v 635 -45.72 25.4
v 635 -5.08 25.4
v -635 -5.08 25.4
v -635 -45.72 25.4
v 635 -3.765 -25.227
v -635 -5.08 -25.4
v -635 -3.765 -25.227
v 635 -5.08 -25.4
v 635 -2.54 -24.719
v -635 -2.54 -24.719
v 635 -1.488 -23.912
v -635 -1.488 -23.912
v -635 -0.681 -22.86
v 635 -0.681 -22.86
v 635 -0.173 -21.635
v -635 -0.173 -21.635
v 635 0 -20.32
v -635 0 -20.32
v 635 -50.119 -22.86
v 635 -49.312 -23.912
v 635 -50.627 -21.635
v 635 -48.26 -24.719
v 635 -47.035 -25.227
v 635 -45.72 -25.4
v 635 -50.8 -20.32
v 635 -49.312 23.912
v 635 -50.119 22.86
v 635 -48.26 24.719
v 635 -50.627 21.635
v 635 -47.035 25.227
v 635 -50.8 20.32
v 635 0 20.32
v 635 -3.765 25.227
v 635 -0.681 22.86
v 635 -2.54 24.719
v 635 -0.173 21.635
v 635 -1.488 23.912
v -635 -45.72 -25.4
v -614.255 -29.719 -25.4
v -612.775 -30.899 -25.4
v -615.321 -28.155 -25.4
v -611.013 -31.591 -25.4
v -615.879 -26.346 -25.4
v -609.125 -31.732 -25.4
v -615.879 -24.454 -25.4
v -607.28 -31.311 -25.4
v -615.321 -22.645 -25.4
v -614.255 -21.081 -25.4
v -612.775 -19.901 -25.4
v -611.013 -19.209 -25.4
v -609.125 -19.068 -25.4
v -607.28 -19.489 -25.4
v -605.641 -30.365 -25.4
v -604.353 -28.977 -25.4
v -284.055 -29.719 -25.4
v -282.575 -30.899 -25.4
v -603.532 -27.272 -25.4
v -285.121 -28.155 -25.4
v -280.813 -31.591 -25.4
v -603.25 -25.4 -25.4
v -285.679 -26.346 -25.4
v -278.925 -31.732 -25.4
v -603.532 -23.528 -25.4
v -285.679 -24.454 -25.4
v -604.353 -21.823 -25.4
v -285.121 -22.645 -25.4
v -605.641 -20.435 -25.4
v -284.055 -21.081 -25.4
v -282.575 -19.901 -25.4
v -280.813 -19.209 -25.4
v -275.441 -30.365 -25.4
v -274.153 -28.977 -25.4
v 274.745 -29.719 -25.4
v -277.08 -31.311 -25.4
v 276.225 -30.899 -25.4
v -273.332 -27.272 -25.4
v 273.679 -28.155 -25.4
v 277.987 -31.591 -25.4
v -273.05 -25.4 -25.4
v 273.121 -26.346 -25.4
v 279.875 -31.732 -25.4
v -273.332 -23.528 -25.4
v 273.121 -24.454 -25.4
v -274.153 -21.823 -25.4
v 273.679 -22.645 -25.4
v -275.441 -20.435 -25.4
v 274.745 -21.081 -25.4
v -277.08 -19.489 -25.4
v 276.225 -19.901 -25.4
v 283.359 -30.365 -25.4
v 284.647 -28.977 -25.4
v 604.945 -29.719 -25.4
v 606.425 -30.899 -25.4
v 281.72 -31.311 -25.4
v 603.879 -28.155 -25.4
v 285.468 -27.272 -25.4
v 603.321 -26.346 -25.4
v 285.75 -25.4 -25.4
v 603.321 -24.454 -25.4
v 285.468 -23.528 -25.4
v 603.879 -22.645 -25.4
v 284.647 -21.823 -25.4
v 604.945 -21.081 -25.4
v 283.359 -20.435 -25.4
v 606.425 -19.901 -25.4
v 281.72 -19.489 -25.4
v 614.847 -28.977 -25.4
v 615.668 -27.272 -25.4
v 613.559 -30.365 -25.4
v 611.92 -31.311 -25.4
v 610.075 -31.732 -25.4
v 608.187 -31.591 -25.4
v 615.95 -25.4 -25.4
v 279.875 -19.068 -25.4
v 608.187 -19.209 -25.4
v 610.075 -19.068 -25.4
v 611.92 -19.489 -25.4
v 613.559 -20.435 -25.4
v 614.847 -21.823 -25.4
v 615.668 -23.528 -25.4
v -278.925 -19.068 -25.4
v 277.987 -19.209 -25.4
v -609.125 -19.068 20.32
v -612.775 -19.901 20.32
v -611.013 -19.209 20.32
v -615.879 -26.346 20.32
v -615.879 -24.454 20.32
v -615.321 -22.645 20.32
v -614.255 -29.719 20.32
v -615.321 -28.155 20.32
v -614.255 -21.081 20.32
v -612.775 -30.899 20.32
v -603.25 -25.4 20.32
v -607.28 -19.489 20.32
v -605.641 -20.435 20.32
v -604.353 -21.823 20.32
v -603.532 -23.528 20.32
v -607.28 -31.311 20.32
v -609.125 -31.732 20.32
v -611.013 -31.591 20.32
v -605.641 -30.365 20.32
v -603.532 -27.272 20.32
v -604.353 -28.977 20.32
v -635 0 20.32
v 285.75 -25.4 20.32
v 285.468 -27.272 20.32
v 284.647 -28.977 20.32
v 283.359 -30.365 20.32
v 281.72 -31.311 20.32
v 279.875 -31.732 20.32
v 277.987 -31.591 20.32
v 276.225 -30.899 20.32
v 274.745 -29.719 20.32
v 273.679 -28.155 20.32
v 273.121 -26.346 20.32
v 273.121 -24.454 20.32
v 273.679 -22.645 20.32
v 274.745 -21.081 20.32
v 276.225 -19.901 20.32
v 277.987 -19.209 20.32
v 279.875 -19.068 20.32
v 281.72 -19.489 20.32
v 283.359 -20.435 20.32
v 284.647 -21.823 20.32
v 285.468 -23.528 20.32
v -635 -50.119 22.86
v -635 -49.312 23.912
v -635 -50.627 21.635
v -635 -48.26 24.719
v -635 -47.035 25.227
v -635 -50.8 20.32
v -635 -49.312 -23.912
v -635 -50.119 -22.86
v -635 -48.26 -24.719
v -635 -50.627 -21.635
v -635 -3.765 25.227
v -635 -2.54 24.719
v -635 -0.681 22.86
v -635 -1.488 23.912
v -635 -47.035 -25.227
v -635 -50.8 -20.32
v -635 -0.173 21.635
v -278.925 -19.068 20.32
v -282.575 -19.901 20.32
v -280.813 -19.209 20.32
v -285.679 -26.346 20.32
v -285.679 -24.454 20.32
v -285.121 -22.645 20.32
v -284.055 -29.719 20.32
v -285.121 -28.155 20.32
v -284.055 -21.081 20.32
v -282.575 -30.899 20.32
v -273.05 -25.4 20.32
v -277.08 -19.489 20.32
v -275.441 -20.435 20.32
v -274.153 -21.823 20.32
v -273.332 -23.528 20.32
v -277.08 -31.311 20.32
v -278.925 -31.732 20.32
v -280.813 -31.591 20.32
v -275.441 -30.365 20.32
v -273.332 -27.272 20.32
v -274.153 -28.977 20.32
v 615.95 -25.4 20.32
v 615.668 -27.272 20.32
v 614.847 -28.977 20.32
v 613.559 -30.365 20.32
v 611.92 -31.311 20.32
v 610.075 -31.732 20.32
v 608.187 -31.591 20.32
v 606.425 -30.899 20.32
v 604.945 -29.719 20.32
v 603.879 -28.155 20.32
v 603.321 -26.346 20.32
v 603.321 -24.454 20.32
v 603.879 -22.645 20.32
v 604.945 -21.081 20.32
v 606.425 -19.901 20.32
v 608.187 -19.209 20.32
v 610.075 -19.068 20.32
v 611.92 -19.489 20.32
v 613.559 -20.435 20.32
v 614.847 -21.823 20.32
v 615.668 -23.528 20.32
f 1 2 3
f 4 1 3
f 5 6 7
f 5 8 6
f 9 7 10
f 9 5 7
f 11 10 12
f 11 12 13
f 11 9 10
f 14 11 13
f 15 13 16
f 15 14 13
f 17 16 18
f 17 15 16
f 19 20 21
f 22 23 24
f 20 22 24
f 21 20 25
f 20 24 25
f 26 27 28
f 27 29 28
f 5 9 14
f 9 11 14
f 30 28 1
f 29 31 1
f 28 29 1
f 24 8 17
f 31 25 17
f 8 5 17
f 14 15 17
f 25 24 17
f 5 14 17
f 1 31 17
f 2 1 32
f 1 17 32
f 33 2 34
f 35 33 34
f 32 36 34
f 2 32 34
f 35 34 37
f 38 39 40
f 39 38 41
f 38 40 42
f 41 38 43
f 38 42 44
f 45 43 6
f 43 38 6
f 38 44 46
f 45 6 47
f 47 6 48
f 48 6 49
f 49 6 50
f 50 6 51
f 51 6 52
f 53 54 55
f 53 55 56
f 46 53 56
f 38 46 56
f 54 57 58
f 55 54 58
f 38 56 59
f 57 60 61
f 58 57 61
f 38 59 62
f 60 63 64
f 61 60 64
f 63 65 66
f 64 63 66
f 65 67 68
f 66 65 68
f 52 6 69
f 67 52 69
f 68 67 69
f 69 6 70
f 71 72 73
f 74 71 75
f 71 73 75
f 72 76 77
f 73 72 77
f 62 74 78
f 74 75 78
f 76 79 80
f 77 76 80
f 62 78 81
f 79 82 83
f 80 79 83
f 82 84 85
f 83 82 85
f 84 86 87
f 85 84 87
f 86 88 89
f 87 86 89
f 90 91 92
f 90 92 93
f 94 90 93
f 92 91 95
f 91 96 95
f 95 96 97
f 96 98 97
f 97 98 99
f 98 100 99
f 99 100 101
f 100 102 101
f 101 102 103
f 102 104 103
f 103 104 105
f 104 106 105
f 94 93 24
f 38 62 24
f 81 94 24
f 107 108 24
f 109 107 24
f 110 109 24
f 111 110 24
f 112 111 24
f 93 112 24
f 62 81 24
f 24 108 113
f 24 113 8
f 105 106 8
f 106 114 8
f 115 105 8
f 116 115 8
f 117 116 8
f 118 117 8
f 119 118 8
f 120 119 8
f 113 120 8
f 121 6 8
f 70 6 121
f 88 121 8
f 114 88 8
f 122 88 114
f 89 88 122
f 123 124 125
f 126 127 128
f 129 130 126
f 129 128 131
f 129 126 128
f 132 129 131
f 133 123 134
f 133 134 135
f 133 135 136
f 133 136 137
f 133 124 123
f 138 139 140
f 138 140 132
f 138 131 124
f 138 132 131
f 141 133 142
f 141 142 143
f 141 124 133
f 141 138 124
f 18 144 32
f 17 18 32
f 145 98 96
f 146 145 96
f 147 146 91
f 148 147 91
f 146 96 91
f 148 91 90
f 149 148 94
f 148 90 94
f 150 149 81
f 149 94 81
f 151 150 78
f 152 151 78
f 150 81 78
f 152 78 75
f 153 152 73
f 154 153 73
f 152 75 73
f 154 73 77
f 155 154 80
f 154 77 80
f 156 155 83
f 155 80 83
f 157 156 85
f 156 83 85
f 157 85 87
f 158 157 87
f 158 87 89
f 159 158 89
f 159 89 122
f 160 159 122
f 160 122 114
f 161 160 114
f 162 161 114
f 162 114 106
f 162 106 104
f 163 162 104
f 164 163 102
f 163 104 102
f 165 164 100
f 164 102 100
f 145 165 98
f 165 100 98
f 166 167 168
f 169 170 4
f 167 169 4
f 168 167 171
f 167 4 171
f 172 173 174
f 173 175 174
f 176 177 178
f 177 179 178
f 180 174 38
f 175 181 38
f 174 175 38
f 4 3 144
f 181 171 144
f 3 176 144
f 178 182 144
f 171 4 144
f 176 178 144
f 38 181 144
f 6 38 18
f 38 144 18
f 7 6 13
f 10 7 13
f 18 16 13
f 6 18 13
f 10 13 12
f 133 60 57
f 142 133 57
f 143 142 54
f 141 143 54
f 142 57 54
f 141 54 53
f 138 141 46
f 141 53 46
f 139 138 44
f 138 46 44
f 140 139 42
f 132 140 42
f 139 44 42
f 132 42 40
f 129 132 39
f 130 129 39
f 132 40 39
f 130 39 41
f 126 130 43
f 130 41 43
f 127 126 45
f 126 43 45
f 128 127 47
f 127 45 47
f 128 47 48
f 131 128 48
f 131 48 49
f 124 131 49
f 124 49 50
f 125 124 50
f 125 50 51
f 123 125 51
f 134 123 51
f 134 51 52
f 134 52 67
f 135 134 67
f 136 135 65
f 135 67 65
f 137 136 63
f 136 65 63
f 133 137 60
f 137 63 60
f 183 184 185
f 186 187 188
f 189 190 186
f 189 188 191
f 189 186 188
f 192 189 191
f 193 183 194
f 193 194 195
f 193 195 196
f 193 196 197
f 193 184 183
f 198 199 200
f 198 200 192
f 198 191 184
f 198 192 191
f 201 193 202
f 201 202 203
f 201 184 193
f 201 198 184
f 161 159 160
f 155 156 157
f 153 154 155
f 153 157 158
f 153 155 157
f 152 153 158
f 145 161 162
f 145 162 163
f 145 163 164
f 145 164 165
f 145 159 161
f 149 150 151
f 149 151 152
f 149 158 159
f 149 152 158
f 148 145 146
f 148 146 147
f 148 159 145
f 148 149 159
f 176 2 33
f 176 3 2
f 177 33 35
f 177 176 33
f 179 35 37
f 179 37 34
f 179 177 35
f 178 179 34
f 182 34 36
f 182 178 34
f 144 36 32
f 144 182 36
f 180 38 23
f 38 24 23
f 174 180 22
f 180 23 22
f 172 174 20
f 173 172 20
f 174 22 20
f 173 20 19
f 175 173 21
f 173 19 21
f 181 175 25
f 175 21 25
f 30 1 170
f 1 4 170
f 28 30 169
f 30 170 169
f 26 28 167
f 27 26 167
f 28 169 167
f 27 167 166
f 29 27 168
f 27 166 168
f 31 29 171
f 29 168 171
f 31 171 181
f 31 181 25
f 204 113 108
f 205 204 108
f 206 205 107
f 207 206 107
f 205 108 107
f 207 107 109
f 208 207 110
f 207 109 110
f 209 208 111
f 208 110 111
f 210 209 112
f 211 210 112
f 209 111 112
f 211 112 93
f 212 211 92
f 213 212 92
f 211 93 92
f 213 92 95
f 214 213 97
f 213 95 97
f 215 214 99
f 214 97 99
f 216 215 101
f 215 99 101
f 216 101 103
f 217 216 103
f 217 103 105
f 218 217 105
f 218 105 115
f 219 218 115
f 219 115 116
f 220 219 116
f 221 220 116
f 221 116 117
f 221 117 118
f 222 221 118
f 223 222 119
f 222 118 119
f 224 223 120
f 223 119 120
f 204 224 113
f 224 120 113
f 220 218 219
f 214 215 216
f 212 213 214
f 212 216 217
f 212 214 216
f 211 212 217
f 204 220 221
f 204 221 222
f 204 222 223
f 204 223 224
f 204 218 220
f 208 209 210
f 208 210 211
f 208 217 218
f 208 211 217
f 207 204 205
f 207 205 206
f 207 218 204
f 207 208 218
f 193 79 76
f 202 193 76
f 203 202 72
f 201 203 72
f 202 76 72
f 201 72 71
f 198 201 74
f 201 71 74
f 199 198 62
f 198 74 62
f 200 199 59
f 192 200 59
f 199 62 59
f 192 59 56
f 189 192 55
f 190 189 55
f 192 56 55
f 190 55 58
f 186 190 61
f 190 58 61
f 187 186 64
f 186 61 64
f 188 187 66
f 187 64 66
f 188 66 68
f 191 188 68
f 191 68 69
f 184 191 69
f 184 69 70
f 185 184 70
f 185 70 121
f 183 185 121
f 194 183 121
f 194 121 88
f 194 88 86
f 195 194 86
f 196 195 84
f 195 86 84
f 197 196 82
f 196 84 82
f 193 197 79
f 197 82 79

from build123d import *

# Parameters (mm, degrees)
F1_DEPTH = 50.8
F2_R     = 5.08
F3_R     = 6.35
F4_DEPTH = 45.72


with BuildPart() as f1:
    # F0 (on Front) → F1 (new body)
    with BuildSketch(Plane.XZ):
        Polygon((635, 25.4), (0, 25.4), (-635, 25.4), (-635, 0), (-635, -25.4), (0, -25.4), (635, -25.4), (635, 0), align=None)
    extrude(amount=F1_DEPTH)

    # F2
    f2_edges = [f1.edges().sort_by_distance(p)[0] for p in [
        (0, -50.8, 25.4),
        (0, 0, 25.4),
        (0, -50.8, -25.4),
        (0, 0, -25.4),
    ]]
    fillet(f2_edges, radius=F2_R)

    # F3 (on face) → F4 (cut)
    with BuildSketch(Plane(origin=(0, 0, -25.4), x_dir=(1, 0, 0), z_dir=(0, 0, -1))):
        with Locations((279.4, 25.4)):
            Circle(F3_R)
        with Locations((609.6, 25.4)):
            Circle(F3_R)
        with Locations((-279.4, 25.4)):
            Circle(F3_R)
        with Locations((-609.6, 25.4)):
            Circle(F3_R)
    extrude(amount=-F4_DEPTH, mode=Mode.SUBTRACT)


solid = f1.part
